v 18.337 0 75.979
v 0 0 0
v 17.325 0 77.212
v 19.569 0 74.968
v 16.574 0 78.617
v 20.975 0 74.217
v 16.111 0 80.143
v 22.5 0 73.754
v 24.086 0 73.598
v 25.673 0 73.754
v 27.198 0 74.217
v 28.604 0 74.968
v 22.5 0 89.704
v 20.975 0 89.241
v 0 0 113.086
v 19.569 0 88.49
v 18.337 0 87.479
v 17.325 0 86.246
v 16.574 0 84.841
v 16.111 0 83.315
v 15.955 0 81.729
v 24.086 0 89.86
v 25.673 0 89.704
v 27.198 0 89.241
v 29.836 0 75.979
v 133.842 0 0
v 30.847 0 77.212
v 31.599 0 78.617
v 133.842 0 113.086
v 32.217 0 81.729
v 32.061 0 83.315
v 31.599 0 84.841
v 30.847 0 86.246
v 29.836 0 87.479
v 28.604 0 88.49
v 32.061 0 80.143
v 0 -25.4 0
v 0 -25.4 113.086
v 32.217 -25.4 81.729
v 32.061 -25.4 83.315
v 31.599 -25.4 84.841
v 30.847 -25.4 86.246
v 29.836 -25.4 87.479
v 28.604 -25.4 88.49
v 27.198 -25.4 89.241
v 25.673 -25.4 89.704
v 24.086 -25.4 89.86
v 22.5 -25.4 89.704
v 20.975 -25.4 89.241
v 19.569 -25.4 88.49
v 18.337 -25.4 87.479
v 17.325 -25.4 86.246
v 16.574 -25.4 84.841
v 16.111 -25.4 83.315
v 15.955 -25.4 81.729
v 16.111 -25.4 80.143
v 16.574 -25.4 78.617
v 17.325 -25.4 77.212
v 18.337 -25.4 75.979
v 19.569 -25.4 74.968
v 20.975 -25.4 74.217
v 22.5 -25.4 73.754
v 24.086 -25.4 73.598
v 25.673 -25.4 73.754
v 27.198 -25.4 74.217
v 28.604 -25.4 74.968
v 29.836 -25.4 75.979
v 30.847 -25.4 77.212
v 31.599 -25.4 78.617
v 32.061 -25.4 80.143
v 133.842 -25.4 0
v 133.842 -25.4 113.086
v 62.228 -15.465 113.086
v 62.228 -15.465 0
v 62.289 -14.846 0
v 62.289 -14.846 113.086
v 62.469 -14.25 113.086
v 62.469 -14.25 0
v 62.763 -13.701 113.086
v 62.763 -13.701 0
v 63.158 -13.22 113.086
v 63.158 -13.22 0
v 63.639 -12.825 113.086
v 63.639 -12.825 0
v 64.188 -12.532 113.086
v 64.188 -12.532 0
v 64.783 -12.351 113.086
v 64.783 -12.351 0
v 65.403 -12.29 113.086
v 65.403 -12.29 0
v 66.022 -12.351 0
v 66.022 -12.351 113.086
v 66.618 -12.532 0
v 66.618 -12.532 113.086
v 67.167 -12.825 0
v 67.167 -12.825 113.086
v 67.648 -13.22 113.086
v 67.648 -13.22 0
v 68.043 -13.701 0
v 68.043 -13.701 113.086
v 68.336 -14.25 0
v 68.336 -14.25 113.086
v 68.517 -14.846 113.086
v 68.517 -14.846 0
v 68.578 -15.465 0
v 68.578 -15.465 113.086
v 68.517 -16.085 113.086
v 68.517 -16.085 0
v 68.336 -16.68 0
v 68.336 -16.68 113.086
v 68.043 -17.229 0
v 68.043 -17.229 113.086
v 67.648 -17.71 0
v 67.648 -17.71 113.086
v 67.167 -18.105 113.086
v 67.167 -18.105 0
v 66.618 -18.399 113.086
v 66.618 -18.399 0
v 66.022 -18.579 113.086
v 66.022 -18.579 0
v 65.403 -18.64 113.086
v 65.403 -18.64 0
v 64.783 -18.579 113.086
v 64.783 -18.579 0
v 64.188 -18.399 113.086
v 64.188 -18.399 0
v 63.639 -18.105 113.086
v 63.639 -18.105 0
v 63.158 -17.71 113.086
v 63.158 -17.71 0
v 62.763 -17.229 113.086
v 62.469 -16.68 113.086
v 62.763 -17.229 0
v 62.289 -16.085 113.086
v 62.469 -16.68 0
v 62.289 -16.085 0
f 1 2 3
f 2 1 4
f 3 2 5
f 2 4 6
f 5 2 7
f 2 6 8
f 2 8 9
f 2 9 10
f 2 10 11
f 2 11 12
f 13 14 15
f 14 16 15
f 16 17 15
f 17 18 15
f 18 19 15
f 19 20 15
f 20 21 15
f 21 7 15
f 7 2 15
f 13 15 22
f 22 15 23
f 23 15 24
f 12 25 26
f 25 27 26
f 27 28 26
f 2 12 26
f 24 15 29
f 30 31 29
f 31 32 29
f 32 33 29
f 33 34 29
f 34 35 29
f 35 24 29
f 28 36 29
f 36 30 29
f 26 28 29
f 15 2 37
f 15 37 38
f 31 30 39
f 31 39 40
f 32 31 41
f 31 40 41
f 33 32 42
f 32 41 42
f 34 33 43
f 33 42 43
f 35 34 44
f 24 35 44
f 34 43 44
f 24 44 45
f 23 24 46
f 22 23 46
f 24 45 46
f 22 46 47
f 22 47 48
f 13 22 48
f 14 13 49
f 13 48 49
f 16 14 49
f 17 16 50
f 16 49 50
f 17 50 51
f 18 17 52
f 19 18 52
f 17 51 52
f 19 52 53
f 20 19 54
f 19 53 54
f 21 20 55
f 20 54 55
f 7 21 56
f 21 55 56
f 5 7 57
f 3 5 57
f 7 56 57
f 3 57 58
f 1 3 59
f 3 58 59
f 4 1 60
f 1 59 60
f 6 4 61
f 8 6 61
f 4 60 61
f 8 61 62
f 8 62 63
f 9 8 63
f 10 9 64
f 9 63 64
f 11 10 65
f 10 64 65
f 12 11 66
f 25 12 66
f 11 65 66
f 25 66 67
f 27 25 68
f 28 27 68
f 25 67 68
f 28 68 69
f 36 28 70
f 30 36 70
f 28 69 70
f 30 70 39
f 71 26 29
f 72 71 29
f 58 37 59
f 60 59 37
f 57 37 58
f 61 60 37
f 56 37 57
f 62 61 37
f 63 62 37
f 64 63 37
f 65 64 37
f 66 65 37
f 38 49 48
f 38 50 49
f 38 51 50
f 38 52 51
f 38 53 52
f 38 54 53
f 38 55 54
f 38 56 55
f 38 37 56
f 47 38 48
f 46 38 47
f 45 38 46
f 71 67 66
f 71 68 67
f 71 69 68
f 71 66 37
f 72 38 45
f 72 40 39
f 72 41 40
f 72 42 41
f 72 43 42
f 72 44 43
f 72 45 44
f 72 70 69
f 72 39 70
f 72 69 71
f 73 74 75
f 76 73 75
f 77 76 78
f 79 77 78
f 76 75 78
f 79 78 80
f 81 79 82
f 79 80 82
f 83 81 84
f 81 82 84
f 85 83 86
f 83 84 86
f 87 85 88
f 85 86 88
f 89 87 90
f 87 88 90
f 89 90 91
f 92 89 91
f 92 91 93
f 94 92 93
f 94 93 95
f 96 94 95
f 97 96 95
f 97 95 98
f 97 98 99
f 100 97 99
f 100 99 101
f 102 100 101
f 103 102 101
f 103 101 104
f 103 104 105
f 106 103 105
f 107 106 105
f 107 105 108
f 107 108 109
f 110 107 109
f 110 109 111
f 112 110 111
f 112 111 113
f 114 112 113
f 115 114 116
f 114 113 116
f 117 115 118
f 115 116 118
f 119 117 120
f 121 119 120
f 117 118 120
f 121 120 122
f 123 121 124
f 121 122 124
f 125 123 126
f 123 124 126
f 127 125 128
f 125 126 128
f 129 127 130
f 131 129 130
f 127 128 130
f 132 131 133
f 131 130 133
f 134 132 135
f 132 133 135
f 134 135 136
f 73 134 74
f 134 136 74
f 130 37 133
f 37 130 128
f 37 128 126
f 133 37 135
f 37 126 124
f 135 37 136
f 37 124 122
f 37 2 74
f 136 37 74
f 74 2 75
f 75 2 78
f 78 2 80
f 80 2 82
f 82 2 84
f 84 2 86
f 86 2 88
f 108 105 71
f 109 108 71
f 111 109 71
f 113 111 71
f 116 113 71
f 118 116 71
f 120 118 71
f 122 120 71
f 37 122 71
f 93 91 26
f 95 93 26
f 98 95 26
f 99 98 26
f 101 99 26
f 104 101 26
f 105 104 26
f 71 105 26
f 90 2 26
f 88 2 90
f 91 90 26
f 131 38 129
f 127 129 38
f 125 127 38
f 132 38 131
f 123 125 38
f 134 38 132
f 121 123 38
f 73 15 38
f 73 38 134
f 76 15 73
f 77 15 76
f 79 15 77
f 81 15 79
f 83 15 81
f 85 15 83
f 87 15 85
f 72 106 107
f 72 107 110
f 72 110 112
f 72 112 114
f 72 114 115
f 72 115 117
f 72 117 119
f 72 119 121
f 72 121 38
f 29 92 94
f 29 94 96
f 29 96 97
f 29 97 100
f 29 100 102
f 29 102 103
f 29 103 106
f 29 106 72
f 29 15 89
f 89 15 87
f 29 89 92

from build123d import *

# Parameters (mm, degrees)
F0_W     = 133.841977
F0_H     = 113.085672
F1_DEPTH = 25.4
F2_R     = 8.131244
F3_DEPTH = 25.4
F5_D     = 6.35


with BuildPart() as f1:
    # F0 (on Front) → F1 (new body)
    with BuildSketch(Plane.XZ):
        with Locations((66.920988, 56.542836)):
            Rectangle(F0_W, F0_H)
    extrude(amount=F1_DEPTH)

    # F2 (on face) → F3 (cut)
    with BuildSketch(Plane.XZ.offset(25.4)):
        with Locations((24.086226, 81.72901)):
            Circle(F2_R)
    extrude(amount=-F3_DEPTH, mode=Mode.SUBTRACT)

    # F5 (through all)
    with Locations(Plane.XY.offset(113.085672)):
        with Locations((65.402642, -15.465394)):
            Hole(F5_D / 2)


solid = f1.part
